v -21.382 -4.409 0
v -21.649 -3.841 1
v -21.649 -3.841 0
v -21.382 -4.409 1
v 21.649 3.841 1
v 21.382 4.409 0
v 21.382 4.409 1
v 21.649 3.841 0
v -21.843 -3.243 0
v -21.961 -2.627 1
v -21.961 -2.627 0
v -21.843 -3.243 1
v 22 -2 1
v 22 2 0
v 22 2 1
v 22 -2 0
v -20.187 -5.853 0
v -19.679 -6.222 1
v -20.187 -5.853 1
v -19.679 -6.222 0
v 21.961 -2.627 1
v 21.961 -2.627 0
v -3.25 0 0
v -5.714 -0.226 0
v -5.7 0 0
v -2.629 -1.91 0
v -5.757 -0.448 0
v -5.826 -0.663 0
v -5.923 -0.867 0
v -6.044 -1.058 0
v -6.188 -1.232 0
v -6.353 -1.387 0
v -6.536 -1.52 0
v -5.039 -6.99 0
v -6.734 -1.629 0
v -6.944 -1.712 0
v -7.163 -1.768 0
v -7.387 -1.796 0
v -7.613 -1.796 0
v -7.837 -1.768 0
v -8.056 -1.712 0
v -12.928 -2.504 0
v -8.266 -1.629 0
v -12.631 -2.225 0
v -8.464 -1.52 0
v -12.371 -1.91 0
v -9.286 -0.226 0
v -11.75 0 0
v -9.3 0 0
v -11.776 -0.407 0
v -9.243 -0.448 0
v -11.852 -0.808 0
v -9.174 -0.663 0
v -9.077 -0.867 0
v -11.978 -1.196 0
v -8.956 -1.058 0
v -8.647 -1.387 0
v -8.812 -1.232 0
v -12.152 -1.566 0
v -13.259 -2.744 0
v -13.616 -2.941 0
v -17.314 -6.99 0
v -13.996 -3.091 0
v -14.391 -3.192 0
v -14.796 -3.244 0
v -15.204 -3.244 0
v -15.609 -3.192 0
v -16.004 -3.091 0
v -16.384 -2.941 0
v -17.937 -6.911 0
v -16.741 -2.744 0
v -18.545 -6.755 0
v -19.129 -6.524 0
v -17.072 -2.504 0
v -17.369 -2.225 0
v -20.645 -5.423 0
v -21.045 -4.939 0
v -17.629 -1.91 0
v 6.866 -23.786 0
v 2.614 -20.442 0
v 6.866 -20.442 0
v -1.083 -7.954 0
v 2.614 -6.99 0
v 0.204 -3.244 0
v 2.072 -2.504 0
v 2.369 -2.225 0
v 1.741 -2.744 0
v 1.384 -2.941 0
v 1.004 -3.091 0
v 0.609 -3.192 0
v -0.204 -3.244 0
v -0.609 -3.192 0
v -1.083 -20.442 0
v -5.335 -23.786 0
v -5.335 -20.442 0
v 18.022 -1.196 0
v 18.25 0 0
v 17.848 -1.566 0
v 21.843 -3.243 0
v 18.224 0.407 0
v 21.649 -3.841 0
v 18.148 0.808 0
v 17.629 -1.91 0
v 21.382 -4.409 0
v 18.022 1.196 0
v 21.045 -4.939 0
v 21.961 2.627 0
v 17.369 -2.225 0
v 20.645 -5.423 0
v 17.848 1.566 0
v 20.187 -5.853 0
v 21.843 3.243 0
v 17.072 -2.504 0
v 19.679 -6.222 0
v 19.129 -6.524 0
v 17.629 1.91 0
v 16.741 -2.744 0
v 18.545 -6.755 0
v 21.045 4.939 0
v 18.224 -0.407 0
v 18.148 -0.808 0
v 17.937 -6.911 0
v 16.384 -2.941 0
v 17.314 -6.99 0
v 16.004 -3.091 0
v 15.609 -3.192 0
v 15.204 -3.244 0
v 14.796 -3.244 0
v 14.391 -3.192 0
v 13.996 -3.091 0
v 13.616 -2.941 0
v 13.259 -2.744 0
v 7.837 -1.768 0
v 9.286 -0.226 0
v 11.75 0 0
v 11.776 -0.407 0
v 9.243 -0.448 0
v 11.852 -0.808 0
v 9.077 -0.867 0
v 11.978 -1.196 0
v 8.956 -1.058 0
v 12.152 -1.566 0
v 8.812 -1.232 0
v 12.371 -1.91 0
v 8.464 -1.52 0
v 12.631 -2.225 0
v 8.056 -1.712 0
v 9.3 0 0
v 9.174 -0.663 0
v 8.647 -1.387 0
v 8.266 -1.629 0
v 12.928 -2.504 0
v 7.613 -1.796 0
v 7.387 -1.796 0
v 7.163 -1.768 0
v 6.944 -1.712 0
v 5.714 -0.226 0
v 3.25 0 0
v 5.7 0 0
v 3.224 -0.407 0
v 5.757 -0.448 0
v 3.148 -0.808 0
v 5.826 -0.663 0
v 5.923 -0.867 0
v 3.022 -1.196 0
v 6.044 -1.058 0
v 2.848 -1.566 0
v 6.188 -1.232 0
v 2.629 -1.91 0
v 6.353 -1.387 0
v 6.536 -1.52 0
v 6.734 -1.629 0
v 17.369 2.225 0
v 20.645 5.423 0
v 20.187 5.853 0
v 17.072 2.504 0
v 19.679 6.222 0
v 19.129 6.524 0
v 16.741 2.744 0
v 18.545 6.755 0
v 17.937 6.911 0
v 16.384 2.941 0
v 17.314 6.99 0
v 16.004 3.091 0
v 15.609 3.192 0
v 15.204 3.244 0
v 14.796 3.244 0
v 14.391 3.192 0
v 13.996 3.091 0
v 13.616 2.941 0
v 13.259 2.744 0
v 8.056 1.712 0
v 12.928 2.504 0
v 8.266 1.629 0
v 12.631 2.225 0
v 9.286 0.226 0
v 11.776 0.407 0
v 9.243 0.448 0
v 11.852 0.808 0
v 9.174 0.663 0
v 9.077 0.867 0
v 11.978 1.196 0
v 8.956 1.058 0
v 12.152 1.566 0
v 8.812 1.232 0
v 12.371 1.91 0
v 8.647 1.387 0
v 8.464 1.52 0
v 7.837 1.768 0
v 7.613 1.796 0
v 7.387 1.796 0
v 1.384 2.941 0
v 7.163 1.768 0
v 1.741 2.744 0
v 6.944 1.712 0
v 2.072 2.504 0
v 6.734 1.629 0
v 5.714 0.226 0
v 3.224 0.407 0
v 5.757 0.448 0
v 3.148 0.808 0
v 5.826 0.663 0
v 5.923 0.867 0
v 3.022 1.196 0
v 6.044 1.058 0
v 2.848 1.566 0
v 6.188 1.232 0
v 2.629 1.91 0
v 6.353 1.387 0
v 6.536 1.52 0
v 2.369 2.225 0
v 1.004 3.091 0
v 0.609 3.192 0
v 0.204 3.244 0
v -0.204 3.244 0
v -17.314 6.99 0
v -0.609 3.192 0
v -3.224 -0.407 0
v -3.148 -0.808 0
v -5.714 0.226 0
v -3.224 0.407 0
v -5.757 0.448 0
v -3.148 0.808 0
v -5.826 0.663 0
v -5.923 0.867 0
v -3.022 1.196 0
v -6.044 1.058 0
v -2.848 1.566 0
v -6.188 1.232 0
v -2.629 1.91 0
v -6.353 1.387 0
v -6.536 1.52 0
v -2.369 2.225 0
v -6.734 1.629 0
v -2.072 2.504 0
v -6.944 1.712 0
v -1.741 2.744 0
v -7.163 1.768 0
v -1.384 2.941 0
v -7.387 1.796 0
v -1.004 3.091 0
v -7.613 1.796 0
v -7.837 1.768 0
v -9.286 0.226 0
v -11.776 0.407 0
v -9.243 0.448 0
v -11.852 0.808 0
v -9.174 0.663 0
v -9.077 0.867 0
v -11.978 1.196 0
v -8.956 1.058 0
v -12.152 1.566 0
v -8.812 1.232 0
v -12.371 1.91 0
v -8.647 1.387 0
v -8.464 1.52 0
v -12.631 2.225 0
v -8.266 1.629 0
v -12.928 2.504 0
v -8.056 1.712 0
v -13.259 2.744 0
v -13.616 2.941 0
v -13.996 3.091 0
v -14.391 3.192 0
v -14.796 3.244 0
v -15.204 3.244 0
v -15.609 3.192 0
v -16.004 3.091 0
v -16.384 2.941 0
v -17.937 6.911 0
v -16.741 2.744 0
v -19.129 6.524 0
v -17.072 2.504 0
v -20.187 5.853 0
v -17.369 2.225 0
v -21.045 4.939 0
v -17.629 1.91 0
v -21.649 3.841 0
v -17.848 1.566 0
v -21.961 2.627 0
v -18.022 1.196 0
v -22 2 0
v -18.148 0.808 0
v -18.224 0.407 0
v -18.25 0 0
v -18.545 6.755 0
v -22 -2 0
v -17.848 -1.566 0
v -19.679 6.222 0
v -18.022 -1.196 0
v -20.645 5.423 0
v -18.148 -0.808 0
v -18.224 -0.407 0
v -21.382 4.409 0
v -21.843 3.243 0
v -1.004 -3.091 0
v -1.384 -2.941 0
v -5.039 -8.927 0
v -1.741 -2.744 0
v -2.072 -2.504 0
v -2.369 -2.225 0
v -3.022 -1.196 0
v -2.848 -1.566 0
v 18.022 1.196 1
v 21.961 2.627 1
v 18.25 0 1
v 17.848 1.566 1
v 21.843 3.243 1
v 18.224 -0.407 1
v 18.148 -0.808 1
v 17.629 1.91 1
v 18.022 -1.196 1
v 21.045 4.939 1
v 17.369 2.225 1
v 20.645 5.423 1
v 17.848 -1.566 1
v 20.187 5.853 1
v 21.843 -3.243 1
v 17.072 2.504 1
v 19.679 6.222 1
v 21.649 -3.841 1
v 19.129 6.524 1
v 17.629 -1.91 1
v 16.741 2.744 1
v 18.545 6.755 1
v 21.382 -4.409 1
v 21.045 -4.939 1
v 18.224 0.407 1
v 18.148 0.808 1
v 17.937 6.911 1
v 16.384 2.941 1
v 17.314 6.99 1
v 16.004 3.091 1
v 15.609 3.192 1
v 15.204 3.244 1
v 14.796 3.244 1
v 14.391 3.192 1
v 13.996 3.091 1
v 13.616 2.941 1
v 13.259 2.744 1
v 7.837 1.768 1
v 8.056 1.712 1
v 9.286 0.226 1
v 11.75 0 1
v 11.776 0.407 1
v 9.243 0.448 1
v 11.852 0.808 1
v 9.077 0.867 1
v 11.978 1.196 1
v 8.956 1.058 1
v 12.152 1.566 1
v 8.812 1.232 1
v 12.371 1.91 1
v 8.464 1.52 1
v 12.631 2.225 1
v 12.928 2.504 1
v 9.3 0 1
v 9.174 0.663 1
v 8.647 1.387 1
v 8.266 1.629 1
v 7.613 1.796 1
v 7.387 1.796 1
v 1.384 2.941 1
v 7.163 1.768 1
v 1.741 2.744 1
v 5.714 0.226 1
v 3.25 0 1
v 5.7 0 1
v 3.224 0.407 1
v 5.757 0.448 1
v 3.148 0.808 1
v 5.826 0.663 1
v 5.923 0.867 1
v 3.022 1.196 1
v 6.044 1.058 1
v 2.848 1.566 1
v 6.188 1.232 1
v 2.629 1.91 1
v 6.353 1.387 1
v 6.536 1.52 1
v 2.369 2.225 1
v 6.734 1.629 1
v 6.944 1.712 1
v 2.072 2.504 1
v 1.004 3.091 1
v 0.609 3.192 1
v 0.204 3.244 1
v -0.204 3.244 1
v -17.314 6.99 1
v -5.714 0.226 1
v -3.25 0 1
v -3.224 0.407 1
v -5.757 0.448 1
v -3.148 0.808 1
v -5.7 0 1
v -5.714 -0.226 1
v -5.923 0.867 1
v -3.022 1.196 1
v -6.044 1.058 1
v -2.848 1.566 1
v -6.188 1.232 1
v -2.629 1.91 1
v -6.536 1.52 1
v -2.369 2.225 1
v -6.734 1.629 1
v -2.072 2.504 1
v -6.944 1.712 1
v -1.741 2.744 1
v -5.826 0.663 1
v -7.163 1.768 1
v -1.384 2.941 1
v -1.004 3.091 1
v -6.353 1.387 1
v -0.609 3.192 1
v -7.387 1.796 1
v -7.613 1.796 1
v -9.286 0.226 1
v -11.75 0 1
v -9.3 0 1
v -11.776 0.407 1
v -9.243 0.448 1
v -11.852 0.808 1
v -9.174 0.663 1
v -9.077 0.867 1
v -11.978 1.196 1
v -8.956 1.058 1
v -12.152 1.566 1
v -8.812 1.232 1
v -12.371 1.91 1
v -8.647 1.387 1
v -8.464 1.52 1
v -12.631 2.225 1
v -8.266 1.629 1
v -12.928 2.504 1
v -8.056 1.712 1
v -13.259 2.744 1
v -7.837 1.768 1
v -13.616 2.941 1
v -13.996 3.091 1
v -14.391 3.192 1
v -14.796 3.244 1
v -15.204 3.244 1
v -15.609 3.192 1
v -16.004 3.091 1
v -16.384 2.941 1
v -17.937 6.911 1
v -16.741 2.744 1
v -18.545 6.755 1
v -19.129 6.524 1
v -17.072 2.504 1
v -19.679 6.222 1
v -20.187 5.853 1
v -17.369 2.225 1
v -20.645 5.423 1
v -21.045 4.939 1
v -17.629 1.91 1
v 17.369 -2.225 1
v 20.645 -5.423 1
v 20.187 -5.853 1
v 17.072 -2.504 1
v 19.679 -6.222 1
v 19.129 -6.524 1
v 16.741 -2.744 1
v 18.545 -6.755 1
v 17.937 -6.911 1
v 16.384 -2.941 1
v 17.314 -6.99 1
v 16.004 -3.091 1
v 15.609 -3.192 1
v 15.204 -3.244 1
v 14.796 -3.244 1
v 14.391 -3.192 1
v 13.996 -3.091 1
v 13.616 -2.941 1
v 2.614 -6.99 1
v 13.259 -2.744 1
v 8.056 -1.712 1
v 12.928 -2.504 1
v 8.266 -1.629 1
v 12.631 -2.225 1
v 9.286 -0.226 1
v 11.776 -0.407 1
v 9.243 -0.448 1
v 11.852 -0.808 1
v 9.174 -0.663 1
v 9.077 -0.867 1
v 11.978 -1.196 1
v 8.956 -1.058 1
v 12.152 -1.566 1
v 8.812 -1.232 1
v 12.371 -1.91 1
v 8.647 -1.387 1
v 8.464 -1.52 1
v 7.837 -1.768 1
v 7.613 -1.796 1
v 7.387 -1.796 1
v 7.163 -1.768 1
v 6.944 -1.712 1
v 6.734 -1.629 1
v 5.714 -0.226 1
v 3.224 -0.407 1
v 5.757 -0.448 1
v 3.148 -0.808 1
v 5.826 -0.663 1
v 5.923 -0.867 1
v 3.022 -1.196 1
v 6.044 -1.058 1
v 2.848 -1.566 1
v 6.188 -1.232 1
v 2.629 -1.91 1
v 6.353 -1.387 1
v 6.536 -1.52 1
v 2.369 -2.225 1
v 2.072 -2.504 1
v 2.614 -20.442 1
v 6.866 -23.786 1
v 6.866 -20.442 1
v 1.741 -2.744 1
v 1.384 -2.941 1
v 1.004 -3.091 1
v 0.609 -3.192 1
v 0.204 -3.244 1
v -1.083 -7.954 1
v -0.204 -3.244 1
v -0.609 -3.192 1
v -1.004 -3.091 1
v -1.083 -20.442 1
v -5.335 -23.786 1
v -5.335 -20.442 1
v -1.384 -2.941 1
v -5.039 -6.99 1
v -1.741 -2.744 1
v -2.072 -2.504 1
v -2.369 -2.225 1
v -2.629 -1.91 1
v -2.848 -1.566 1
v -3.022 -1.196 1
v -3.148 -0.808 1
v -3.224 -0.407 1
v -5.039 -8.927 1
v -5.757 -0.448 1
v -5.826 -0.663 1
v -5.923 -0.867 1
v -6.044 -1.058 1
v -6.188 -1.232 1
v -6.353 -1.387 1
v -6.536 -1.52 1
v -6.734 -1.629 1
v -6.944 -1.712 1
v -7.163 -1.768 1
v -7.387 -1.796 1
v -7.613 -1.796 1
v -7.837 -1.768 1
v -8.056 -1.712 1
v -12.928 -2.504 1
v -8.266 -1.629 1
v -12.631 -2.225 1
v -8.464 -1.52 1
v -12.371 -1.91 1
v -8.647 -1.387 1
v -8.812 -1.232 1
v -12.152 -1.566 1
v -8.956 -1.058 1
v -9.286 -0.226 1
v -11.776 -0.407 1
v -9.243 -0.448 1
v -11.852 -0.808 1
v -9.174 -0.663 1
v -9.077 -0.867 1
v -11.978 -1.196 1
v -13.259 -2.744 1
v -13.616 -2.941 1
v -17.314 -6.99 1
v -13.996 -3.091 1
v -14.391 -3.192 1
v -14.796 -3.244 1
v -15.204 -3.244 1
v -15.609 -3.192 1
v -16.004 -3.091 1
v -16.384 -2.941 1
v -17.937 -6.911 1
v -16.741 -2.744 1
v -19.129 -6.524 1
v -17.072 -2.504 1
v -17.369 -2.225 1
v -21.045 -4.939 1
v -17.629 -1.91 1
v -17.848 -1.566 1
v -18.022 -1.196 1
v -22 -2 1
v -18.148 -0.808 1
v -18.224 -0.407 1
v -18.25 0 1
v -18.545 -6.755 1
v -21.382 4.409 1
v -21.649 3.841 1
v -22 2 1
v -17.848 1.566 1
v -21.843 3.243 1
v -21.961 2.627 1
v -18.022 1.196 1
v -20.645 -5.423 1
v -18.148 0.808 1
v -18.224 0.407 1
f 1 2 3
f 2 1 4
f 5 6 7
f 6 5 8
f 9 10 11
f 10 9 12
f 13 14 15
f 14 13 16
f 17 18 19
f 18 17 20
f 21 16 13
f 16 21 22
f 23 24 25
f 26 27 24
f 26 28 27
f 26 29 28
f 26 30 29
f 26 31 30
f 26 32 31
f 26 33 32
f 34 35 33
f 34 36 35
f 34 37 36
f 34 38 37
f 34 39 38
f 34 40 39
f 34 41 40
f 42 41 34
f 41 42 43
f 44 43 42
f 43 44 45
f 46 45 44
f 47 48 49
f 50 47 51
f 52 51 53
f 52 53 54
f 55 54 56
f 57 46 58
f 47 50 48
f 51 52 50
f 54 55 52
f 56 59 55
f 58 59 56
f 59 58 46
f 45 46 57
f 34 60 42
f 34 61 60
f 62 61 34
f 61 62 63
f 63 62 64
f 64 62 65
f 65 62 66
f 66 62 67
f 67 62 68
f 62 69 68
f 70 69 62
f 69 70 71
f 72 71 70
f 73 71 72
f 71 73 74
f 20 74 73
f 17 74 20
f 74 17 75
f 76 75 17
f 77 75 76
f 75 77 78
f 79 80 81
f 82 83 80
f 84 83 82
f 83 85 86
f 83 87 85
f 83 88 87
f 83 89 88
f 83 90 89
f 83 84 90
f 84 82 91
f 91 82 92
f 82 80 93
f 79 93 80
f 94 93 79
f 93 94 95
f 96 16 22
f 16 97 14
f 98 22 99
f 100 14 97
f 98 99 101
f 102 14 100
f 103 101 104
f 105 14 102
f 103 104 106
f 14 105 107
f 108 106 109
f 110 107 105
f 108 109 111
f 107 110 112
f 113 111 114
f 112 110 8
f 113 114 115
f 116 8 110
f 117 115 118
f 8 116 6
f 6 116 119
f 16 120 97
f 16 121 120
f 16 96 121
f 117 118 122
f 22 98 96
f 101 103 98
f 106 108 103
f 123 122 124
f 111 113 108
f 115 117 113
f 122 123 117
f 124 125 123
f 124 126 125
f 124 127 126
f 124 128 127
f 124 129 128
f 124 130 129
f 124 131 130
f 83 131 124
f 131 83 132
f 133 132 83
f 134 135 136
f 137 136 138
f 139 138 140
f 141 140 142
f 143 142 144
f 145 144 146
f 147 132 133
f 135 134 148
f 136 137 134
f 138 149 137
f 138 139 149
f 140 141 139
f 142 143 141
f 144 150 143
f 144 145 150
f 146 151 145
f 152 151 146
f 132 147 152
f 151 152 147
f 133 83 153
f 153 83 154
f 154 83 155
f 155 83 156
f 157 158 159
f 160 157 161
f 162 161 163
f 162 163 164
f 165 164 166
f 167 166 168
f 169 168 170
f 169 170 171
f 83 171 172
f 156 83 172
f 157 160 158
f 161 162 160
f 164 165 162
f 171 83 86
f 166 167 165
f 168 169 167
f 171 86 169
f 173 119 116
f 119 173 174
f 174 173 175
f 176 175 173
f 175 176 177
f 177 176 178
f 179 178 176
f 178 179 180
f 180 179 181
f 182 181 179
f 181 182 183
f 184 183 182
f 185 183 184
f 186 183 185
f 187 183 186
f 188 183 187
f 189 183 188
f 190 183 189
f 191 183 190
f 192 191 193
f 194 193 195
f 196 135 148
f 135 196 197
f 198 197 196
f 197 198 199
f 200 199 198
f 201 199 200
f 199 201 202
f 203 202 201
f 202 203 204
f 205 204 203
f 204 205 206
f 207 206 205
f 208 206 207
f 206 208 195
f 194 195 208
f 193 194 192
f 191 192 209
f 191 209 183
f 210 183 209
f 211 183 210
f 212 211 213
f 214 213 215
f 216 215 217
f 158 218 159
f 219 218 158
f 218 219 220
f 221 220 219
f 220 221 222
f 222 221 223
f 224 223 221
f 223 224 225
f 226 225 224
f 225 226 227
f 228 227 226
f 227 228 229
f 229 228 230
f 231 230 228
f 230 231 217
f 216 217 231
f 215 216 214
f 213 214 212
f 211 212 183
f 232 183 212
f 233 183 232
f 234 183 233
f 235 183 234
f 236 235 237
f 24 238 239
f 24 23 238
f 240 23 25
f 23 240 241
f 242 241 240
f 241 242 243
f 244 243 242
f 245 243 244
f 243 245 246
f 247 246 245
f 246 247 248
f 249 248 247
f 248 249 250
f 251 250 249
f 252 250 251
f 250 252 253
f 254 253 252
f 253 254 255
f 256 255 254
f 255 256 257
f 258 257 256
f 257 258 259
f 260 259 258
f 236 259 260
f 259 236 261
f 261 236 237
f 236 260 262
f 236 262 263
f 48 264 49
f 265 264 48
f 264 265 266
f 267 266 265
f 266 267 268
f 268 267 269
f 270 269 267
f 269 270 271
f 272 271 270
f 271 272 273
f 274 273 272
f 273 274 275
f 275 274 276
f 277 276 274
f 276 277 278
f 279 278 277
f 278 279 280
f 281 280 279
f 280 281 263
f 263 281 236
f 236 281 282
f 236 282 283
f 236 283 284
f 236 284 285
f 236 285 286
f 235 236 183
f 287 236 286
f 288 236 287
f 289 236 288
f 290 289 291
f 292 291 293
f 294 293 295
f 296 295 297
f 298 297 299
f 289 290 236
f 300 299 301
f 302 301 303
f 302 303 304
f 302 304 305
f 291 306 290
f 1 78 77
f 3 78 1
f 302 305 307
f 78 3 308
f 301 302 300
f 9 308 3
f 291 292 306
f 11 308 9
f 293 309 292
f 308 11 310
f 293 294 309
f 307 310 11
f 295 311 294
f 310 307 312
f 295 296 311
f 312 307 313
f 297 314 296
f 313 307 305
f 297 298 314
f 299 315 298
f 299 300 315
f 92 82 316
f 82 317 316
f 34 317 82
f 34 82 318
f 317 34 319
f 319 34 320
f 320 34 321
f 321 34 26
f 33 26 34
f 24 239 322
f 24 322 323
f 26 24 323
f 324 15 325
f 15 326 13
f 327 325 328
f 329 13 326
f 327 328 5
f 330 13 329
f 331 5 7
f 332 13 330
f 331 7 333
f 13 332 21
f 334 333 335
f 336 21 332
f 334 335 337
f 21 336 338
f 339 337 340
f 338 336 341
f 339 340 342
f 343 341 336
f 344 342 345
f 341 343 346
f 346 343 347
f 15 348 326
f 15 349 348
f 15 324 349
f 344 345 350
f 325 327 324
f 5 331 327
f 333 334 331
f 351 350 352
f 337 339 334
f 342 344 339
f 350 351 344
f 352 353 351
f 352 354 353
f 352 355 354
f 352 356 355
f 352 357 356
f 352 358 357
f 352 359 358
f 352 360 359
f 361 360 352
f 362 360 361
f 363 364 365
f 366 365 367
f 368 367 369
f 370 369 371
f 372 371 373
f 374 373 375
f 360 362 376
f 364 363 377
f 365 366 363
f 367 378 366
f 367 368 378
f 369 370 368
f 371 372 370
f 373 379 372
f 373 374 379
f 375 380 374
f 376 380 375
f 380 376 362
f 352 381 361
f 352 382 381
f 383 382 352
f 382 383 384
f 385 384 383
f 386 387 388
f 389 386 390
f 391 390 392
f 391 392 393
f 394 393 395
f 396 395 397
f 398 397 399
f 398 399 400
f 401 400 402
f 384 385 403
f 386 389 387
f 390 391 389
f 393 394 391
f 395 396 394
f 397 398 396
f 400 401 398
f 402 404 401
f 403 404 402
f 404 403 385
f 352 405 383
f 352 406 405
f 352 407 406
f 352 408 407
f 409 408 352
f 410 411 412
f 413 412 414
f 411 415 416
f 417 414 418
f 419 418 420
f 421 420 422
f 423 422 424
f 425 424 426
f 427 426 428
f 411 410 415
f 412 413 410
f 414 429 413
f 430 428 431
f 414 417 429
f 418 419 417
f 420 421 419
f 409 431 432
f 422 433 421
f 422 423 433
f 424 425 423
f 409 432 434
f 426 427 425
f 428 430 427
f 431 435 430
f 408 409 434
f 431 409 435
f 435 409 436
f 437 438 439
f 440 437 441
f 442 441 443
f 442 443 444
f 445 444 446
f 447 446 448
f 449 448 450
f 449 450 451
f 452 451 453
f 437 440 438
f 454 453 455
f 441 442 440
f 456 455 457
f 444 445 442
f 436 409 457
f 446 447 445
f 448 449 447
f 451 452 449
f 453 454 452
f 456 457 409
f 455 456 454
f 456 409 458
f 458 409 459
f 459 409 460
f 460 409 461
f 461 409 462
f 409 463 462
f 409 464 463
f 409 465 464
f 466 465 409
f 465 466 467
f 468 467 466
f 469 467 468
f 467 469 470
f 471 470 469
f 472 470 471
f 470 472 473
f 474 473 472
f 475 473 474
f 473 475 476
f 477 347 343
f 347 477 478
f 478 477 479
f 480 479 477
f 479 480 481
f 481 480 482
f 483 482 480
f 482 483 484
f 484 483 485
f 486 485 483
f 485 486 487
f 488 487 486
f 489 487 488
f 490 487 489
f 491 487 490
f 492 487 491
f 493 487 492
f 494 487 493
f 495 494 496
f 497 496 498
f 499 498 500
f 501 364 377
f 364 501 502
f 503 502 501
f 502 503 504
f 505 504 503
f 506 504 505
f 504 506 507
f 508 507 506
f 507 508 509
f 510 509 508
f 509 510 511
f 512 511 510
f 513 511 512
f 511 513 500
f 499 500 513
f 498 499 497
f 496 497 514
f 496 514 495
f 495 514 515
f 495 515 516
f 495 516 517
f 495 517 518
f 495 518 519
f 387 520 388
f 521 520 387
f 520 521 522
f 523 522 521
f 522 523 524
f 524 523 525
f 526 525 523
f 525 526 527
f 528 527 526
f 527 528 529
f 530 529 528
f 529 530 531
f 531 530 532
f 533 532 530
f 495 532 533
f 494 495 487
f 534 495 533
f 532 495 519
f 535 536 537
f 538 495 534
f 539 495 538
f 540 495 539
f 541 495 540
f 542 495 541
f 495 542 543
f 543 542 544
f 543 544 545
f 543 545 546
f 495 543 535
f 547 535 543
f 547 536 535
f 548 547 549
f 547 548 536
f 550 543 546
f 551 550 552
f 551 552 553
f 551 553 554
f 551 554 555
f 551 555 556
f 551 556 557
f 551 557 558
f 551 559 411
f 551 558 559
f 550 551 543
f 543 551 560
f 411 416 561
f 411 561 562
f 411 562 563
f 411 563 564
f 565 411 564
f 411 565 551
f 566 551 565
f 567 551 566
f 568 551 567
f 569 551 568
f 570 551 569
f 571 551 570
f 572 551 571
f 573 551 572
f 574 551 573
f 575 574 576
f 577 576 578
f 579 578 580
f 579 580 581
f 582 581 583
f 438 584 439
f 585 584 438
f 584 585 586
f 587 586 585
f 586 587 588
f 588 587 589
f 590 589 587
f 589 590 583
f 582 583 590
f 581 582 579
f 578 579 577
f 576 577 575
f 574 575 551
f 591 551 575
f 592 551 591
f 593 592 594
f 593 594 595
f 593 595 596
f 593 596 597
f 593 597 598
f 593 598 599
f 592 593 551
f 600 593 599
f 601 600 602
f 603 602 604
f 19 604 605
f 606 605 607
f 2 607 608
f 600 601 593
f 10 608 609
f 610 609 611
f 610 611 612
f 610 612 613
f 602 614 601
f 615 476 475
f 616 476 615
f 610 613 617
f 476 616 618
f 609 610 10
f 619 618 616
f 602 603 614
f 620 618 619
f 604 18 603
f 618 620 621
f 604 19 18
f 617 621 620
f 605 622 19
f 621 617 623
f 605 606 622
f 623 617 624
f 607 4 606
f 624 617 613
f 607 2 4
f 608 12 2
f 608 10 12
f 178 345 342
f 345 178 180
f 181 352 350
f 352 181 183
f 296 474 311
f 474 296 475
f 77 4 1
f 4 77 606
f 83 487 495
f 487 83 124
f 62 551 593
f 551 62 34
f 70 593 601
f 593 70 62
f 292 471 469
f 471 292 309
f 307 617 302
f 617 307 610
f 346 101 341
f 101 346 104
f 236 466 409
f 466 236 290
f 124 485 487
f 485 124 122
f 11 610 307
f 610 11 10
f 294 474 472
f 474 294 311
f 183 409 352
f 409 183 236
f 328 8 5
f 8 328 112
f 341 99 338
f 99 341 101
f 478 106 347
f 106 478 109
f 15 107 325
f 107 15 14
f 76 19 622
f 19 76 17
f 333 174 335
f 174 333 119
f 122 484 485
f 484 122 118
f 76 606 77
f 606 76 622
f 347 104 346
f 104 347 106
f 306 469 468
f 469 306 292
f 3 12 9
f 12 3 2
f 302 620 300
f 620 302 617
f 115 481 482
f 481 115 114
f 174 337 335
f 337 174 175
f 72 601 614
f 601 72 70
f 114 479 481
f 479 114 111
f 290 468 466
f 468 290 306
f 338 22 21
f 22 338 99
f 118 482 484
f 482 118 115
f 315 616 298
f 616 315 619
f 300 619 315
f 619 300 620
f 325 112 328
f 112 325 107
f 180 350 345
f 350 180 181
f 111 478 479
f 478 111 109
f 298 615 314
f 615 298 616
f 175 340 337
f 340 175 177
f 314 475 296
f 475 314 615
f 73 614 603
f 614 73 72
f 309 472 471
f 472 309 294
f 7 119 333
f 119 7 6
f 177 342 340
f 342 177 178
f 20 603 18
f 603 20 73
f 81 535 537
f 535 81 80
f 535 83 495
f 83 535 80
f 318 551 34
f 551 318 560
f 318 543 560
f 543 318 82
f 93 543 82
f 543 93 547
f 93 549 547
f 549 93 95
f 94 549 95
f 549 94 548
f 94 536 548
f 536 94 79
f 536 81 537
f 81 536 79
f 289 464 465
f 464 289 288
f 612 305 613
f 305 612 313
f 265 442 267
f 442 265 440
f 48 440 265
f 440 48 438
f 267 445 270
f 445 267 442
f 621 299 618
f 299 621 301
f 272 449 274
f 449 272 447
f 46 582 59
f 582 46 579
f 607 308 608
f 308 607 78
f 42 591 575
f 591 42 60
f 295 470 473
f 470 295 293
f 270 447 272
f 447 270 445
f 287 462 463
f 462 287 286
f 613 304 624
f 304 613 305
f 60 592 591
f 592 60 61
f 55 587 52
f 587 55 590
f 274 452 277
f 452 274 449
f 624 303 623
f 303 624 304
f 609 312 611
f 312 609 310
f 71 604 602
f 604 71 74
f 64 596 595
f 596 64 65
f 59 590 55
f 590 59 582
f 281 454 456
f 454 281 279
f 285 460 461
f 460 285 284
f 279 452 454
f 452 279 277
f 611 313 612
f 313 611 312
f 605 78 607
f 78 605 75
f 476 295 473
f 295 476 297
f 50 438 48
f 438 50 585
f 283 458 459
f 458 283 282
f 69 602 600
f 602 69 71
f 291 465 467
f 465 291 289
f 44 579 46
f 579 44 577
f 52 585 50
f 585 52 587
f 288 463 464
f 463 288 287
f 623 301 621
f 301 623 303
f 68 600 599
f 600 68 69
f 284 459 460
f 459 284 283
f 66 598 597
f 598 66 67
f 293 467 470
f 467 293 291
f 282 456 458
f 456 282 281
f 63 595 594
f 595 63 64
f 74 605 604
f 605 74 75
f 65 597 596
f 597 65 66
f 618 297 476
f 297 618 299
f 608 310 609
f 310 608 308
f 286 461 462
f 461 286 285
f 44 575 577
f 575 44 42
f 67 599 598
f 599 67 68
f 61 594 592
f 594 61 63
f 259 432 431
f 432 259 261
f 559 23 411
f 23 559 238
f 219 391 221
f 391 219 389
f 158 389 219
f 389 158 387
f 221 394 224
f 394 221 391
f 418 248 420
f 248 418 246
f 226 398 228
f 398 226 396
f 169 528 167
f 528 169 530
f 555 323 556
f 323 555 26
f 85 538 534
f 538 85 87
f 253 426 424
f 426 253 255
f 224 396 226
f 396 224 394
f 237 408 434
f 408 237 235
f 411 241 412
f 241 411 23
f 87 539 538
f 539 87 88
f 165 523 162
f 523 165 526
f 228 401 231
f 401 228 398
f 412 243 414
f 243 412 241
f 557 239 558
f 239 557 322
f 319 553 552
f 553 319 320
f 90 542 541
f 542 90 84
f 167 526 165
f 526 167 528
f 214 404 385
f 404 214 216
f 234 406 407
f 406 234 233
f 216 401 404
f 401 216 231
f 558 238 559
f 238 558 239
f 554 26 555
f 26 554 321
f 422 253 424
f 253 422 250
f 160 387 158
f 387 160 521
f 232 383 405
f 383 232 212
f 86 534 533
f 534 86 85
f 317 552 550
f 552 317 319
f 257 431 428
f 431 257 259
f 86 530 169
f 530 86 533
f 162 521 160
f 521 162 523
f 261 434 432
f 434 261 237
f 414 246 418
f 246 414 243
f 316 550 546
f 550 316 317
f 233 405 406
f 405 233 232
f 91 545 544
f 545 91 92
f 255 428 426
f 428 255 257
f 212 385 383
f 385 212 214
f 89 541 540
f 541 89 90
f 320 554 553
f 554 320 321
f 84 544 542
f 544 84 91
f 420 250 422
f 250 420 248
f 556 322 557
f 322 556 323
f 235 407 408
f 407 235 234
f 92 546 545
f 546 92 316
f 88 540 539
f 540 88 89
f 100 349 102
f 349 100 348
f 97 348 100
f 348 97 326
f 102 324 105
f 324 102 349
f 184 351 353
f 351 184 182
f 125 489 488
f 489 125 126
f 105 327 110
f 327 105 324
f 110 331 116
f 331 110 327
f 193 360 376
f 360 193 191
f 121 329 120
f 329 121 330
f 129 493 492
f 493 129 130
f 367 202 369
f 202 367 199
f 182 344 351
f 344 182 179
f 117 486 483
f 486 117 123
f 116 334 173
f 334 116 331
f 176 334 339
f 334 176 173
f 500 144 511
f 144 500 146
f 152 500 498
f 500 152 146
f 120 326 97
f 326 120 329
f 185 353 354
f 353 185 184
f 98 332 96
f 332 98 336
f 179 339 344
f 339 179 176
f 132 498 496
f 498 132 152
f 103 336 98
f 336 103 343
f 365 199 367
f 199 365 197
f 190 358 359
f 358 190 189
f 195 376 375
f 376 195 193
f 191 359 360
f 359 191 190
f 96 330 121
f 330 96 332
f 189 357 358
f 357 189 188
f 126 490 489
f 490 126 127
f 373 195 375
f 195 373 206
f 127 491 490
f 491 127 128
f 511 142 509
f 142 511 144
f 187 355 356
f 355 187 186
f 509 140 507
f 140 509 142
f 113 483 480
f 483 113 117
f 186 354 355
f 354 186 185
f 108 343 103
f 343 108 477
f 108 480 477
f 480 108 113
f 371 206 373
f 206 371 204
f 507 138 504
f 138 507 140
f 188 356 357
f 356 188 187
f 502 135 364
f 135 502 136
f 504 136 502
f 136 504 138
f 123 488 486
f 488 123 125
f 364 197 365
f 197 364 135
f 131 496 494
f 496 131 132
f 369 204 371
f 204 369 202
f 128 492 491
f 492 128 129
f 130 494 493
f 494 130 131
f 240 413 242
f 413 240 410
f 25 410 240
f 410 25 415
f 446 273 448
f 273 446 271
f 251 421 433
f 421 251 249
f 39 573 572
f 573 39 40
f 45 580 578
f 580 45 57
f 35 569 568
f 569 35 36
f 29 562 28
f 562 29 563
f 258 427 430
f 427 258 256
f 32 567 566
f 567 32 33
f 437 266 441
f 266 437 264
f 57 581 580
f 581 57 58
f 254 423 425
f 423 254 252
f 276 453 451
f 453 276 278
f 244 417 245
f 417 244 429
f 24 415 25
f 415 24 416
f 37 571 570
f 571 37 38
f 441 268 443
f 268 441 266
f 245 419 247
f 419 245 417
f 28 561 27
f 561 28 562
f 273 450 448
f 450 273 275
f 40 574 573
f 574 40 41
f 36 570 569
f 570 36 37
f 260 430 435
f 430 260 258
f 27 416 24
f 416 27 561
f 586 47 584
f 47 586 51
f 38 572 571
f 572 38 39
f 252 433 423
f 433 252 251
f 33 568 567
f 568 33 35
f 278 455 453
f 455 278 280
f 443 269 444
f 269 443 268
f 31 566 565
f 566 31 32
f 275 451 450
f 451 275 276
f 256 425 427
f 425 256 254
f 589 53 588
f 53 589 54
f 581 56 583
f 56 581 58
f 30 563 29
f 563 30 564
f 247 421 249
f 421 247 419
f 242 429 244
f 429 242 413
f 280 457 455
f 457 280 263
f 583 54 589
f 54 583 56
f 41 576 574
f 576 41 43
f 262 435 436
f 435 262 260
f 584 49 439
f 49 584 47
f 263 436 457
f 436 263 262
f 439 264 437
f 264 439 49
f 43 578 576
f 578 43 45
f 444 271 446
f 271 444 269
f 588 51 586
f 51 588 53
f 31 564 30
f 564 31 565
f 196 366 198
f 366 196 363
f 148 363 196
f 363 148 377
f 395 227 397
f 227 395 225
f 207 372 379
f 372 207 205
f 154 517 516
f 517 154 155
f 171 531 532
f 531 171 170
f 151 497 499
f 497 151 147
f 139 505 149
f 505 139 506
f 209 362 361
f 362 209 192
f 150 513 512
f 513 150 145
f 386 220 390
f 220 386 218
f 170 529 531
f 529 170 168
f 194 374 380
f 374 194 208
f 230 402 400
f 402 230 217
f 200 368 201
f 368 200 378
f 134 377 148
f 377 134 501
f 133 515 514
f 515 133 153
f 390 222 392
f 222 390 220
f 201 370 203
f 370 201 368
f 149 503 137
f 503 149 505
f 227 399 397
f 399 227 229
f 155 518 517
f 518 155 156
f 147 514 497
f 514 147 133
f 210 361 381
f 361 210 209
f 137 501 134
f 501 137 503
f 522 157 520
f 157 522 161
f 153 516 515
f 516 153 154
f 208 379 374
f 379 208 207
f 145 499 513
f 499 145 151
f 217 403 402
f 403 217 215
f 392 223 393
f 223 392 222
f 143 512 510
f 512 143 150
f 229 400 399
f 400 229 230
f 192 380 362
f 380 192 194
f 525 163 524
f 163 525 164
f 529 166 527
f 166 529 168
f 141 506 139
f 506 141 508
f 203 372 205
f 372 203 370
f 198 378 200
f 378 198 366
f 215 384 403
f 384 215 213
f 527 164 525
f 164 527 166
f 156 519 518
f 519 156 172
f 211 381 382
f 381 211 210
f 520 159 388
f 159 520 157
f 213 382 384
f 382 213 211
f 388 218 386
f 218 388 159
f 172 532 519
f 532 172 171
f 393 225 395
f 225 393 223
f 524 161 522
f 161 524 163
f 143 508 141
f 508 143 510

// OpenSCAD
$fn = 50;


difference() {
	union() {
		hull() {
			translate(v = [-17.0000000000, 2.0000000000, 0]) {
				cylinder(h = 1, r = 5);
			}
			translate(v = [17.0000000000, 2.0000000000, 0]) {
				cylinder(h = 1, r = 5);
			}
			translate(v = [-17.0000000000, -2.0000000000, 0]) {
				cylinder(h = 1, r = 5);
			}
			translate(v = [17.0000000000, -2.0000000000, 0]) {
				cylinder(h = 1, r = 5);
			}
		}
		translate(v = [0, -5, 0]) {
			linear_extrude(height = 1) {
				text(font = "DejaVu Sans Mono:style=Bold", halign = "center", size = 19.0000000000, text = "1", valign = "top");
			}
		}
	}
	union() {
		translate(v = [-15.0000000000, 0.0000000000, 0]) {
			translate(v = [0, 0, -100]) {
				cylinder(h = 200, r = 3.2500000000);
			}
		}
		translate(v = [0, 0, -100]) {
			cylinder(h = 200, r = 3.2500000000);
		}
		translate(v = [15.0000000000, 0.0000000000, 0]) {
			translate(v = [0, 0, -100]) {
				cylinder(h = 200, r = 3.2500000000);
			}
		}
		translate(v = [-15.0000000000, 0.0000000000, 0]) {
			translate(v = [0, 0, -100]) {
				cylinder(h = 200, r = 1.8000000000);
			}
		}
		translate(v = [-7.5000000000, 0.0000000000, 0]) {
			translate(v = [0, 0, -100]) {
				cylinder(h = 200, r = 1.8000000000);
			}
		}
		translate(v = [0, 0, -100]) {
			cylinder(h = 200, r = 1.8000000000);
		}
		translate(v = [7.5000000000, 0.0000000000, 0]) {
			translate(v = [0, 0, -100]) {
				cylinder(h = 200, r = 1.8000000000);
			}
		}
		translate(v = [15.0000000000, 0.0000000000, 0]) {
			translate(v = [0, 0, -100]) {
				cylinder(h = 200, r = 1.8000000000);
			}
		}
	}
}
